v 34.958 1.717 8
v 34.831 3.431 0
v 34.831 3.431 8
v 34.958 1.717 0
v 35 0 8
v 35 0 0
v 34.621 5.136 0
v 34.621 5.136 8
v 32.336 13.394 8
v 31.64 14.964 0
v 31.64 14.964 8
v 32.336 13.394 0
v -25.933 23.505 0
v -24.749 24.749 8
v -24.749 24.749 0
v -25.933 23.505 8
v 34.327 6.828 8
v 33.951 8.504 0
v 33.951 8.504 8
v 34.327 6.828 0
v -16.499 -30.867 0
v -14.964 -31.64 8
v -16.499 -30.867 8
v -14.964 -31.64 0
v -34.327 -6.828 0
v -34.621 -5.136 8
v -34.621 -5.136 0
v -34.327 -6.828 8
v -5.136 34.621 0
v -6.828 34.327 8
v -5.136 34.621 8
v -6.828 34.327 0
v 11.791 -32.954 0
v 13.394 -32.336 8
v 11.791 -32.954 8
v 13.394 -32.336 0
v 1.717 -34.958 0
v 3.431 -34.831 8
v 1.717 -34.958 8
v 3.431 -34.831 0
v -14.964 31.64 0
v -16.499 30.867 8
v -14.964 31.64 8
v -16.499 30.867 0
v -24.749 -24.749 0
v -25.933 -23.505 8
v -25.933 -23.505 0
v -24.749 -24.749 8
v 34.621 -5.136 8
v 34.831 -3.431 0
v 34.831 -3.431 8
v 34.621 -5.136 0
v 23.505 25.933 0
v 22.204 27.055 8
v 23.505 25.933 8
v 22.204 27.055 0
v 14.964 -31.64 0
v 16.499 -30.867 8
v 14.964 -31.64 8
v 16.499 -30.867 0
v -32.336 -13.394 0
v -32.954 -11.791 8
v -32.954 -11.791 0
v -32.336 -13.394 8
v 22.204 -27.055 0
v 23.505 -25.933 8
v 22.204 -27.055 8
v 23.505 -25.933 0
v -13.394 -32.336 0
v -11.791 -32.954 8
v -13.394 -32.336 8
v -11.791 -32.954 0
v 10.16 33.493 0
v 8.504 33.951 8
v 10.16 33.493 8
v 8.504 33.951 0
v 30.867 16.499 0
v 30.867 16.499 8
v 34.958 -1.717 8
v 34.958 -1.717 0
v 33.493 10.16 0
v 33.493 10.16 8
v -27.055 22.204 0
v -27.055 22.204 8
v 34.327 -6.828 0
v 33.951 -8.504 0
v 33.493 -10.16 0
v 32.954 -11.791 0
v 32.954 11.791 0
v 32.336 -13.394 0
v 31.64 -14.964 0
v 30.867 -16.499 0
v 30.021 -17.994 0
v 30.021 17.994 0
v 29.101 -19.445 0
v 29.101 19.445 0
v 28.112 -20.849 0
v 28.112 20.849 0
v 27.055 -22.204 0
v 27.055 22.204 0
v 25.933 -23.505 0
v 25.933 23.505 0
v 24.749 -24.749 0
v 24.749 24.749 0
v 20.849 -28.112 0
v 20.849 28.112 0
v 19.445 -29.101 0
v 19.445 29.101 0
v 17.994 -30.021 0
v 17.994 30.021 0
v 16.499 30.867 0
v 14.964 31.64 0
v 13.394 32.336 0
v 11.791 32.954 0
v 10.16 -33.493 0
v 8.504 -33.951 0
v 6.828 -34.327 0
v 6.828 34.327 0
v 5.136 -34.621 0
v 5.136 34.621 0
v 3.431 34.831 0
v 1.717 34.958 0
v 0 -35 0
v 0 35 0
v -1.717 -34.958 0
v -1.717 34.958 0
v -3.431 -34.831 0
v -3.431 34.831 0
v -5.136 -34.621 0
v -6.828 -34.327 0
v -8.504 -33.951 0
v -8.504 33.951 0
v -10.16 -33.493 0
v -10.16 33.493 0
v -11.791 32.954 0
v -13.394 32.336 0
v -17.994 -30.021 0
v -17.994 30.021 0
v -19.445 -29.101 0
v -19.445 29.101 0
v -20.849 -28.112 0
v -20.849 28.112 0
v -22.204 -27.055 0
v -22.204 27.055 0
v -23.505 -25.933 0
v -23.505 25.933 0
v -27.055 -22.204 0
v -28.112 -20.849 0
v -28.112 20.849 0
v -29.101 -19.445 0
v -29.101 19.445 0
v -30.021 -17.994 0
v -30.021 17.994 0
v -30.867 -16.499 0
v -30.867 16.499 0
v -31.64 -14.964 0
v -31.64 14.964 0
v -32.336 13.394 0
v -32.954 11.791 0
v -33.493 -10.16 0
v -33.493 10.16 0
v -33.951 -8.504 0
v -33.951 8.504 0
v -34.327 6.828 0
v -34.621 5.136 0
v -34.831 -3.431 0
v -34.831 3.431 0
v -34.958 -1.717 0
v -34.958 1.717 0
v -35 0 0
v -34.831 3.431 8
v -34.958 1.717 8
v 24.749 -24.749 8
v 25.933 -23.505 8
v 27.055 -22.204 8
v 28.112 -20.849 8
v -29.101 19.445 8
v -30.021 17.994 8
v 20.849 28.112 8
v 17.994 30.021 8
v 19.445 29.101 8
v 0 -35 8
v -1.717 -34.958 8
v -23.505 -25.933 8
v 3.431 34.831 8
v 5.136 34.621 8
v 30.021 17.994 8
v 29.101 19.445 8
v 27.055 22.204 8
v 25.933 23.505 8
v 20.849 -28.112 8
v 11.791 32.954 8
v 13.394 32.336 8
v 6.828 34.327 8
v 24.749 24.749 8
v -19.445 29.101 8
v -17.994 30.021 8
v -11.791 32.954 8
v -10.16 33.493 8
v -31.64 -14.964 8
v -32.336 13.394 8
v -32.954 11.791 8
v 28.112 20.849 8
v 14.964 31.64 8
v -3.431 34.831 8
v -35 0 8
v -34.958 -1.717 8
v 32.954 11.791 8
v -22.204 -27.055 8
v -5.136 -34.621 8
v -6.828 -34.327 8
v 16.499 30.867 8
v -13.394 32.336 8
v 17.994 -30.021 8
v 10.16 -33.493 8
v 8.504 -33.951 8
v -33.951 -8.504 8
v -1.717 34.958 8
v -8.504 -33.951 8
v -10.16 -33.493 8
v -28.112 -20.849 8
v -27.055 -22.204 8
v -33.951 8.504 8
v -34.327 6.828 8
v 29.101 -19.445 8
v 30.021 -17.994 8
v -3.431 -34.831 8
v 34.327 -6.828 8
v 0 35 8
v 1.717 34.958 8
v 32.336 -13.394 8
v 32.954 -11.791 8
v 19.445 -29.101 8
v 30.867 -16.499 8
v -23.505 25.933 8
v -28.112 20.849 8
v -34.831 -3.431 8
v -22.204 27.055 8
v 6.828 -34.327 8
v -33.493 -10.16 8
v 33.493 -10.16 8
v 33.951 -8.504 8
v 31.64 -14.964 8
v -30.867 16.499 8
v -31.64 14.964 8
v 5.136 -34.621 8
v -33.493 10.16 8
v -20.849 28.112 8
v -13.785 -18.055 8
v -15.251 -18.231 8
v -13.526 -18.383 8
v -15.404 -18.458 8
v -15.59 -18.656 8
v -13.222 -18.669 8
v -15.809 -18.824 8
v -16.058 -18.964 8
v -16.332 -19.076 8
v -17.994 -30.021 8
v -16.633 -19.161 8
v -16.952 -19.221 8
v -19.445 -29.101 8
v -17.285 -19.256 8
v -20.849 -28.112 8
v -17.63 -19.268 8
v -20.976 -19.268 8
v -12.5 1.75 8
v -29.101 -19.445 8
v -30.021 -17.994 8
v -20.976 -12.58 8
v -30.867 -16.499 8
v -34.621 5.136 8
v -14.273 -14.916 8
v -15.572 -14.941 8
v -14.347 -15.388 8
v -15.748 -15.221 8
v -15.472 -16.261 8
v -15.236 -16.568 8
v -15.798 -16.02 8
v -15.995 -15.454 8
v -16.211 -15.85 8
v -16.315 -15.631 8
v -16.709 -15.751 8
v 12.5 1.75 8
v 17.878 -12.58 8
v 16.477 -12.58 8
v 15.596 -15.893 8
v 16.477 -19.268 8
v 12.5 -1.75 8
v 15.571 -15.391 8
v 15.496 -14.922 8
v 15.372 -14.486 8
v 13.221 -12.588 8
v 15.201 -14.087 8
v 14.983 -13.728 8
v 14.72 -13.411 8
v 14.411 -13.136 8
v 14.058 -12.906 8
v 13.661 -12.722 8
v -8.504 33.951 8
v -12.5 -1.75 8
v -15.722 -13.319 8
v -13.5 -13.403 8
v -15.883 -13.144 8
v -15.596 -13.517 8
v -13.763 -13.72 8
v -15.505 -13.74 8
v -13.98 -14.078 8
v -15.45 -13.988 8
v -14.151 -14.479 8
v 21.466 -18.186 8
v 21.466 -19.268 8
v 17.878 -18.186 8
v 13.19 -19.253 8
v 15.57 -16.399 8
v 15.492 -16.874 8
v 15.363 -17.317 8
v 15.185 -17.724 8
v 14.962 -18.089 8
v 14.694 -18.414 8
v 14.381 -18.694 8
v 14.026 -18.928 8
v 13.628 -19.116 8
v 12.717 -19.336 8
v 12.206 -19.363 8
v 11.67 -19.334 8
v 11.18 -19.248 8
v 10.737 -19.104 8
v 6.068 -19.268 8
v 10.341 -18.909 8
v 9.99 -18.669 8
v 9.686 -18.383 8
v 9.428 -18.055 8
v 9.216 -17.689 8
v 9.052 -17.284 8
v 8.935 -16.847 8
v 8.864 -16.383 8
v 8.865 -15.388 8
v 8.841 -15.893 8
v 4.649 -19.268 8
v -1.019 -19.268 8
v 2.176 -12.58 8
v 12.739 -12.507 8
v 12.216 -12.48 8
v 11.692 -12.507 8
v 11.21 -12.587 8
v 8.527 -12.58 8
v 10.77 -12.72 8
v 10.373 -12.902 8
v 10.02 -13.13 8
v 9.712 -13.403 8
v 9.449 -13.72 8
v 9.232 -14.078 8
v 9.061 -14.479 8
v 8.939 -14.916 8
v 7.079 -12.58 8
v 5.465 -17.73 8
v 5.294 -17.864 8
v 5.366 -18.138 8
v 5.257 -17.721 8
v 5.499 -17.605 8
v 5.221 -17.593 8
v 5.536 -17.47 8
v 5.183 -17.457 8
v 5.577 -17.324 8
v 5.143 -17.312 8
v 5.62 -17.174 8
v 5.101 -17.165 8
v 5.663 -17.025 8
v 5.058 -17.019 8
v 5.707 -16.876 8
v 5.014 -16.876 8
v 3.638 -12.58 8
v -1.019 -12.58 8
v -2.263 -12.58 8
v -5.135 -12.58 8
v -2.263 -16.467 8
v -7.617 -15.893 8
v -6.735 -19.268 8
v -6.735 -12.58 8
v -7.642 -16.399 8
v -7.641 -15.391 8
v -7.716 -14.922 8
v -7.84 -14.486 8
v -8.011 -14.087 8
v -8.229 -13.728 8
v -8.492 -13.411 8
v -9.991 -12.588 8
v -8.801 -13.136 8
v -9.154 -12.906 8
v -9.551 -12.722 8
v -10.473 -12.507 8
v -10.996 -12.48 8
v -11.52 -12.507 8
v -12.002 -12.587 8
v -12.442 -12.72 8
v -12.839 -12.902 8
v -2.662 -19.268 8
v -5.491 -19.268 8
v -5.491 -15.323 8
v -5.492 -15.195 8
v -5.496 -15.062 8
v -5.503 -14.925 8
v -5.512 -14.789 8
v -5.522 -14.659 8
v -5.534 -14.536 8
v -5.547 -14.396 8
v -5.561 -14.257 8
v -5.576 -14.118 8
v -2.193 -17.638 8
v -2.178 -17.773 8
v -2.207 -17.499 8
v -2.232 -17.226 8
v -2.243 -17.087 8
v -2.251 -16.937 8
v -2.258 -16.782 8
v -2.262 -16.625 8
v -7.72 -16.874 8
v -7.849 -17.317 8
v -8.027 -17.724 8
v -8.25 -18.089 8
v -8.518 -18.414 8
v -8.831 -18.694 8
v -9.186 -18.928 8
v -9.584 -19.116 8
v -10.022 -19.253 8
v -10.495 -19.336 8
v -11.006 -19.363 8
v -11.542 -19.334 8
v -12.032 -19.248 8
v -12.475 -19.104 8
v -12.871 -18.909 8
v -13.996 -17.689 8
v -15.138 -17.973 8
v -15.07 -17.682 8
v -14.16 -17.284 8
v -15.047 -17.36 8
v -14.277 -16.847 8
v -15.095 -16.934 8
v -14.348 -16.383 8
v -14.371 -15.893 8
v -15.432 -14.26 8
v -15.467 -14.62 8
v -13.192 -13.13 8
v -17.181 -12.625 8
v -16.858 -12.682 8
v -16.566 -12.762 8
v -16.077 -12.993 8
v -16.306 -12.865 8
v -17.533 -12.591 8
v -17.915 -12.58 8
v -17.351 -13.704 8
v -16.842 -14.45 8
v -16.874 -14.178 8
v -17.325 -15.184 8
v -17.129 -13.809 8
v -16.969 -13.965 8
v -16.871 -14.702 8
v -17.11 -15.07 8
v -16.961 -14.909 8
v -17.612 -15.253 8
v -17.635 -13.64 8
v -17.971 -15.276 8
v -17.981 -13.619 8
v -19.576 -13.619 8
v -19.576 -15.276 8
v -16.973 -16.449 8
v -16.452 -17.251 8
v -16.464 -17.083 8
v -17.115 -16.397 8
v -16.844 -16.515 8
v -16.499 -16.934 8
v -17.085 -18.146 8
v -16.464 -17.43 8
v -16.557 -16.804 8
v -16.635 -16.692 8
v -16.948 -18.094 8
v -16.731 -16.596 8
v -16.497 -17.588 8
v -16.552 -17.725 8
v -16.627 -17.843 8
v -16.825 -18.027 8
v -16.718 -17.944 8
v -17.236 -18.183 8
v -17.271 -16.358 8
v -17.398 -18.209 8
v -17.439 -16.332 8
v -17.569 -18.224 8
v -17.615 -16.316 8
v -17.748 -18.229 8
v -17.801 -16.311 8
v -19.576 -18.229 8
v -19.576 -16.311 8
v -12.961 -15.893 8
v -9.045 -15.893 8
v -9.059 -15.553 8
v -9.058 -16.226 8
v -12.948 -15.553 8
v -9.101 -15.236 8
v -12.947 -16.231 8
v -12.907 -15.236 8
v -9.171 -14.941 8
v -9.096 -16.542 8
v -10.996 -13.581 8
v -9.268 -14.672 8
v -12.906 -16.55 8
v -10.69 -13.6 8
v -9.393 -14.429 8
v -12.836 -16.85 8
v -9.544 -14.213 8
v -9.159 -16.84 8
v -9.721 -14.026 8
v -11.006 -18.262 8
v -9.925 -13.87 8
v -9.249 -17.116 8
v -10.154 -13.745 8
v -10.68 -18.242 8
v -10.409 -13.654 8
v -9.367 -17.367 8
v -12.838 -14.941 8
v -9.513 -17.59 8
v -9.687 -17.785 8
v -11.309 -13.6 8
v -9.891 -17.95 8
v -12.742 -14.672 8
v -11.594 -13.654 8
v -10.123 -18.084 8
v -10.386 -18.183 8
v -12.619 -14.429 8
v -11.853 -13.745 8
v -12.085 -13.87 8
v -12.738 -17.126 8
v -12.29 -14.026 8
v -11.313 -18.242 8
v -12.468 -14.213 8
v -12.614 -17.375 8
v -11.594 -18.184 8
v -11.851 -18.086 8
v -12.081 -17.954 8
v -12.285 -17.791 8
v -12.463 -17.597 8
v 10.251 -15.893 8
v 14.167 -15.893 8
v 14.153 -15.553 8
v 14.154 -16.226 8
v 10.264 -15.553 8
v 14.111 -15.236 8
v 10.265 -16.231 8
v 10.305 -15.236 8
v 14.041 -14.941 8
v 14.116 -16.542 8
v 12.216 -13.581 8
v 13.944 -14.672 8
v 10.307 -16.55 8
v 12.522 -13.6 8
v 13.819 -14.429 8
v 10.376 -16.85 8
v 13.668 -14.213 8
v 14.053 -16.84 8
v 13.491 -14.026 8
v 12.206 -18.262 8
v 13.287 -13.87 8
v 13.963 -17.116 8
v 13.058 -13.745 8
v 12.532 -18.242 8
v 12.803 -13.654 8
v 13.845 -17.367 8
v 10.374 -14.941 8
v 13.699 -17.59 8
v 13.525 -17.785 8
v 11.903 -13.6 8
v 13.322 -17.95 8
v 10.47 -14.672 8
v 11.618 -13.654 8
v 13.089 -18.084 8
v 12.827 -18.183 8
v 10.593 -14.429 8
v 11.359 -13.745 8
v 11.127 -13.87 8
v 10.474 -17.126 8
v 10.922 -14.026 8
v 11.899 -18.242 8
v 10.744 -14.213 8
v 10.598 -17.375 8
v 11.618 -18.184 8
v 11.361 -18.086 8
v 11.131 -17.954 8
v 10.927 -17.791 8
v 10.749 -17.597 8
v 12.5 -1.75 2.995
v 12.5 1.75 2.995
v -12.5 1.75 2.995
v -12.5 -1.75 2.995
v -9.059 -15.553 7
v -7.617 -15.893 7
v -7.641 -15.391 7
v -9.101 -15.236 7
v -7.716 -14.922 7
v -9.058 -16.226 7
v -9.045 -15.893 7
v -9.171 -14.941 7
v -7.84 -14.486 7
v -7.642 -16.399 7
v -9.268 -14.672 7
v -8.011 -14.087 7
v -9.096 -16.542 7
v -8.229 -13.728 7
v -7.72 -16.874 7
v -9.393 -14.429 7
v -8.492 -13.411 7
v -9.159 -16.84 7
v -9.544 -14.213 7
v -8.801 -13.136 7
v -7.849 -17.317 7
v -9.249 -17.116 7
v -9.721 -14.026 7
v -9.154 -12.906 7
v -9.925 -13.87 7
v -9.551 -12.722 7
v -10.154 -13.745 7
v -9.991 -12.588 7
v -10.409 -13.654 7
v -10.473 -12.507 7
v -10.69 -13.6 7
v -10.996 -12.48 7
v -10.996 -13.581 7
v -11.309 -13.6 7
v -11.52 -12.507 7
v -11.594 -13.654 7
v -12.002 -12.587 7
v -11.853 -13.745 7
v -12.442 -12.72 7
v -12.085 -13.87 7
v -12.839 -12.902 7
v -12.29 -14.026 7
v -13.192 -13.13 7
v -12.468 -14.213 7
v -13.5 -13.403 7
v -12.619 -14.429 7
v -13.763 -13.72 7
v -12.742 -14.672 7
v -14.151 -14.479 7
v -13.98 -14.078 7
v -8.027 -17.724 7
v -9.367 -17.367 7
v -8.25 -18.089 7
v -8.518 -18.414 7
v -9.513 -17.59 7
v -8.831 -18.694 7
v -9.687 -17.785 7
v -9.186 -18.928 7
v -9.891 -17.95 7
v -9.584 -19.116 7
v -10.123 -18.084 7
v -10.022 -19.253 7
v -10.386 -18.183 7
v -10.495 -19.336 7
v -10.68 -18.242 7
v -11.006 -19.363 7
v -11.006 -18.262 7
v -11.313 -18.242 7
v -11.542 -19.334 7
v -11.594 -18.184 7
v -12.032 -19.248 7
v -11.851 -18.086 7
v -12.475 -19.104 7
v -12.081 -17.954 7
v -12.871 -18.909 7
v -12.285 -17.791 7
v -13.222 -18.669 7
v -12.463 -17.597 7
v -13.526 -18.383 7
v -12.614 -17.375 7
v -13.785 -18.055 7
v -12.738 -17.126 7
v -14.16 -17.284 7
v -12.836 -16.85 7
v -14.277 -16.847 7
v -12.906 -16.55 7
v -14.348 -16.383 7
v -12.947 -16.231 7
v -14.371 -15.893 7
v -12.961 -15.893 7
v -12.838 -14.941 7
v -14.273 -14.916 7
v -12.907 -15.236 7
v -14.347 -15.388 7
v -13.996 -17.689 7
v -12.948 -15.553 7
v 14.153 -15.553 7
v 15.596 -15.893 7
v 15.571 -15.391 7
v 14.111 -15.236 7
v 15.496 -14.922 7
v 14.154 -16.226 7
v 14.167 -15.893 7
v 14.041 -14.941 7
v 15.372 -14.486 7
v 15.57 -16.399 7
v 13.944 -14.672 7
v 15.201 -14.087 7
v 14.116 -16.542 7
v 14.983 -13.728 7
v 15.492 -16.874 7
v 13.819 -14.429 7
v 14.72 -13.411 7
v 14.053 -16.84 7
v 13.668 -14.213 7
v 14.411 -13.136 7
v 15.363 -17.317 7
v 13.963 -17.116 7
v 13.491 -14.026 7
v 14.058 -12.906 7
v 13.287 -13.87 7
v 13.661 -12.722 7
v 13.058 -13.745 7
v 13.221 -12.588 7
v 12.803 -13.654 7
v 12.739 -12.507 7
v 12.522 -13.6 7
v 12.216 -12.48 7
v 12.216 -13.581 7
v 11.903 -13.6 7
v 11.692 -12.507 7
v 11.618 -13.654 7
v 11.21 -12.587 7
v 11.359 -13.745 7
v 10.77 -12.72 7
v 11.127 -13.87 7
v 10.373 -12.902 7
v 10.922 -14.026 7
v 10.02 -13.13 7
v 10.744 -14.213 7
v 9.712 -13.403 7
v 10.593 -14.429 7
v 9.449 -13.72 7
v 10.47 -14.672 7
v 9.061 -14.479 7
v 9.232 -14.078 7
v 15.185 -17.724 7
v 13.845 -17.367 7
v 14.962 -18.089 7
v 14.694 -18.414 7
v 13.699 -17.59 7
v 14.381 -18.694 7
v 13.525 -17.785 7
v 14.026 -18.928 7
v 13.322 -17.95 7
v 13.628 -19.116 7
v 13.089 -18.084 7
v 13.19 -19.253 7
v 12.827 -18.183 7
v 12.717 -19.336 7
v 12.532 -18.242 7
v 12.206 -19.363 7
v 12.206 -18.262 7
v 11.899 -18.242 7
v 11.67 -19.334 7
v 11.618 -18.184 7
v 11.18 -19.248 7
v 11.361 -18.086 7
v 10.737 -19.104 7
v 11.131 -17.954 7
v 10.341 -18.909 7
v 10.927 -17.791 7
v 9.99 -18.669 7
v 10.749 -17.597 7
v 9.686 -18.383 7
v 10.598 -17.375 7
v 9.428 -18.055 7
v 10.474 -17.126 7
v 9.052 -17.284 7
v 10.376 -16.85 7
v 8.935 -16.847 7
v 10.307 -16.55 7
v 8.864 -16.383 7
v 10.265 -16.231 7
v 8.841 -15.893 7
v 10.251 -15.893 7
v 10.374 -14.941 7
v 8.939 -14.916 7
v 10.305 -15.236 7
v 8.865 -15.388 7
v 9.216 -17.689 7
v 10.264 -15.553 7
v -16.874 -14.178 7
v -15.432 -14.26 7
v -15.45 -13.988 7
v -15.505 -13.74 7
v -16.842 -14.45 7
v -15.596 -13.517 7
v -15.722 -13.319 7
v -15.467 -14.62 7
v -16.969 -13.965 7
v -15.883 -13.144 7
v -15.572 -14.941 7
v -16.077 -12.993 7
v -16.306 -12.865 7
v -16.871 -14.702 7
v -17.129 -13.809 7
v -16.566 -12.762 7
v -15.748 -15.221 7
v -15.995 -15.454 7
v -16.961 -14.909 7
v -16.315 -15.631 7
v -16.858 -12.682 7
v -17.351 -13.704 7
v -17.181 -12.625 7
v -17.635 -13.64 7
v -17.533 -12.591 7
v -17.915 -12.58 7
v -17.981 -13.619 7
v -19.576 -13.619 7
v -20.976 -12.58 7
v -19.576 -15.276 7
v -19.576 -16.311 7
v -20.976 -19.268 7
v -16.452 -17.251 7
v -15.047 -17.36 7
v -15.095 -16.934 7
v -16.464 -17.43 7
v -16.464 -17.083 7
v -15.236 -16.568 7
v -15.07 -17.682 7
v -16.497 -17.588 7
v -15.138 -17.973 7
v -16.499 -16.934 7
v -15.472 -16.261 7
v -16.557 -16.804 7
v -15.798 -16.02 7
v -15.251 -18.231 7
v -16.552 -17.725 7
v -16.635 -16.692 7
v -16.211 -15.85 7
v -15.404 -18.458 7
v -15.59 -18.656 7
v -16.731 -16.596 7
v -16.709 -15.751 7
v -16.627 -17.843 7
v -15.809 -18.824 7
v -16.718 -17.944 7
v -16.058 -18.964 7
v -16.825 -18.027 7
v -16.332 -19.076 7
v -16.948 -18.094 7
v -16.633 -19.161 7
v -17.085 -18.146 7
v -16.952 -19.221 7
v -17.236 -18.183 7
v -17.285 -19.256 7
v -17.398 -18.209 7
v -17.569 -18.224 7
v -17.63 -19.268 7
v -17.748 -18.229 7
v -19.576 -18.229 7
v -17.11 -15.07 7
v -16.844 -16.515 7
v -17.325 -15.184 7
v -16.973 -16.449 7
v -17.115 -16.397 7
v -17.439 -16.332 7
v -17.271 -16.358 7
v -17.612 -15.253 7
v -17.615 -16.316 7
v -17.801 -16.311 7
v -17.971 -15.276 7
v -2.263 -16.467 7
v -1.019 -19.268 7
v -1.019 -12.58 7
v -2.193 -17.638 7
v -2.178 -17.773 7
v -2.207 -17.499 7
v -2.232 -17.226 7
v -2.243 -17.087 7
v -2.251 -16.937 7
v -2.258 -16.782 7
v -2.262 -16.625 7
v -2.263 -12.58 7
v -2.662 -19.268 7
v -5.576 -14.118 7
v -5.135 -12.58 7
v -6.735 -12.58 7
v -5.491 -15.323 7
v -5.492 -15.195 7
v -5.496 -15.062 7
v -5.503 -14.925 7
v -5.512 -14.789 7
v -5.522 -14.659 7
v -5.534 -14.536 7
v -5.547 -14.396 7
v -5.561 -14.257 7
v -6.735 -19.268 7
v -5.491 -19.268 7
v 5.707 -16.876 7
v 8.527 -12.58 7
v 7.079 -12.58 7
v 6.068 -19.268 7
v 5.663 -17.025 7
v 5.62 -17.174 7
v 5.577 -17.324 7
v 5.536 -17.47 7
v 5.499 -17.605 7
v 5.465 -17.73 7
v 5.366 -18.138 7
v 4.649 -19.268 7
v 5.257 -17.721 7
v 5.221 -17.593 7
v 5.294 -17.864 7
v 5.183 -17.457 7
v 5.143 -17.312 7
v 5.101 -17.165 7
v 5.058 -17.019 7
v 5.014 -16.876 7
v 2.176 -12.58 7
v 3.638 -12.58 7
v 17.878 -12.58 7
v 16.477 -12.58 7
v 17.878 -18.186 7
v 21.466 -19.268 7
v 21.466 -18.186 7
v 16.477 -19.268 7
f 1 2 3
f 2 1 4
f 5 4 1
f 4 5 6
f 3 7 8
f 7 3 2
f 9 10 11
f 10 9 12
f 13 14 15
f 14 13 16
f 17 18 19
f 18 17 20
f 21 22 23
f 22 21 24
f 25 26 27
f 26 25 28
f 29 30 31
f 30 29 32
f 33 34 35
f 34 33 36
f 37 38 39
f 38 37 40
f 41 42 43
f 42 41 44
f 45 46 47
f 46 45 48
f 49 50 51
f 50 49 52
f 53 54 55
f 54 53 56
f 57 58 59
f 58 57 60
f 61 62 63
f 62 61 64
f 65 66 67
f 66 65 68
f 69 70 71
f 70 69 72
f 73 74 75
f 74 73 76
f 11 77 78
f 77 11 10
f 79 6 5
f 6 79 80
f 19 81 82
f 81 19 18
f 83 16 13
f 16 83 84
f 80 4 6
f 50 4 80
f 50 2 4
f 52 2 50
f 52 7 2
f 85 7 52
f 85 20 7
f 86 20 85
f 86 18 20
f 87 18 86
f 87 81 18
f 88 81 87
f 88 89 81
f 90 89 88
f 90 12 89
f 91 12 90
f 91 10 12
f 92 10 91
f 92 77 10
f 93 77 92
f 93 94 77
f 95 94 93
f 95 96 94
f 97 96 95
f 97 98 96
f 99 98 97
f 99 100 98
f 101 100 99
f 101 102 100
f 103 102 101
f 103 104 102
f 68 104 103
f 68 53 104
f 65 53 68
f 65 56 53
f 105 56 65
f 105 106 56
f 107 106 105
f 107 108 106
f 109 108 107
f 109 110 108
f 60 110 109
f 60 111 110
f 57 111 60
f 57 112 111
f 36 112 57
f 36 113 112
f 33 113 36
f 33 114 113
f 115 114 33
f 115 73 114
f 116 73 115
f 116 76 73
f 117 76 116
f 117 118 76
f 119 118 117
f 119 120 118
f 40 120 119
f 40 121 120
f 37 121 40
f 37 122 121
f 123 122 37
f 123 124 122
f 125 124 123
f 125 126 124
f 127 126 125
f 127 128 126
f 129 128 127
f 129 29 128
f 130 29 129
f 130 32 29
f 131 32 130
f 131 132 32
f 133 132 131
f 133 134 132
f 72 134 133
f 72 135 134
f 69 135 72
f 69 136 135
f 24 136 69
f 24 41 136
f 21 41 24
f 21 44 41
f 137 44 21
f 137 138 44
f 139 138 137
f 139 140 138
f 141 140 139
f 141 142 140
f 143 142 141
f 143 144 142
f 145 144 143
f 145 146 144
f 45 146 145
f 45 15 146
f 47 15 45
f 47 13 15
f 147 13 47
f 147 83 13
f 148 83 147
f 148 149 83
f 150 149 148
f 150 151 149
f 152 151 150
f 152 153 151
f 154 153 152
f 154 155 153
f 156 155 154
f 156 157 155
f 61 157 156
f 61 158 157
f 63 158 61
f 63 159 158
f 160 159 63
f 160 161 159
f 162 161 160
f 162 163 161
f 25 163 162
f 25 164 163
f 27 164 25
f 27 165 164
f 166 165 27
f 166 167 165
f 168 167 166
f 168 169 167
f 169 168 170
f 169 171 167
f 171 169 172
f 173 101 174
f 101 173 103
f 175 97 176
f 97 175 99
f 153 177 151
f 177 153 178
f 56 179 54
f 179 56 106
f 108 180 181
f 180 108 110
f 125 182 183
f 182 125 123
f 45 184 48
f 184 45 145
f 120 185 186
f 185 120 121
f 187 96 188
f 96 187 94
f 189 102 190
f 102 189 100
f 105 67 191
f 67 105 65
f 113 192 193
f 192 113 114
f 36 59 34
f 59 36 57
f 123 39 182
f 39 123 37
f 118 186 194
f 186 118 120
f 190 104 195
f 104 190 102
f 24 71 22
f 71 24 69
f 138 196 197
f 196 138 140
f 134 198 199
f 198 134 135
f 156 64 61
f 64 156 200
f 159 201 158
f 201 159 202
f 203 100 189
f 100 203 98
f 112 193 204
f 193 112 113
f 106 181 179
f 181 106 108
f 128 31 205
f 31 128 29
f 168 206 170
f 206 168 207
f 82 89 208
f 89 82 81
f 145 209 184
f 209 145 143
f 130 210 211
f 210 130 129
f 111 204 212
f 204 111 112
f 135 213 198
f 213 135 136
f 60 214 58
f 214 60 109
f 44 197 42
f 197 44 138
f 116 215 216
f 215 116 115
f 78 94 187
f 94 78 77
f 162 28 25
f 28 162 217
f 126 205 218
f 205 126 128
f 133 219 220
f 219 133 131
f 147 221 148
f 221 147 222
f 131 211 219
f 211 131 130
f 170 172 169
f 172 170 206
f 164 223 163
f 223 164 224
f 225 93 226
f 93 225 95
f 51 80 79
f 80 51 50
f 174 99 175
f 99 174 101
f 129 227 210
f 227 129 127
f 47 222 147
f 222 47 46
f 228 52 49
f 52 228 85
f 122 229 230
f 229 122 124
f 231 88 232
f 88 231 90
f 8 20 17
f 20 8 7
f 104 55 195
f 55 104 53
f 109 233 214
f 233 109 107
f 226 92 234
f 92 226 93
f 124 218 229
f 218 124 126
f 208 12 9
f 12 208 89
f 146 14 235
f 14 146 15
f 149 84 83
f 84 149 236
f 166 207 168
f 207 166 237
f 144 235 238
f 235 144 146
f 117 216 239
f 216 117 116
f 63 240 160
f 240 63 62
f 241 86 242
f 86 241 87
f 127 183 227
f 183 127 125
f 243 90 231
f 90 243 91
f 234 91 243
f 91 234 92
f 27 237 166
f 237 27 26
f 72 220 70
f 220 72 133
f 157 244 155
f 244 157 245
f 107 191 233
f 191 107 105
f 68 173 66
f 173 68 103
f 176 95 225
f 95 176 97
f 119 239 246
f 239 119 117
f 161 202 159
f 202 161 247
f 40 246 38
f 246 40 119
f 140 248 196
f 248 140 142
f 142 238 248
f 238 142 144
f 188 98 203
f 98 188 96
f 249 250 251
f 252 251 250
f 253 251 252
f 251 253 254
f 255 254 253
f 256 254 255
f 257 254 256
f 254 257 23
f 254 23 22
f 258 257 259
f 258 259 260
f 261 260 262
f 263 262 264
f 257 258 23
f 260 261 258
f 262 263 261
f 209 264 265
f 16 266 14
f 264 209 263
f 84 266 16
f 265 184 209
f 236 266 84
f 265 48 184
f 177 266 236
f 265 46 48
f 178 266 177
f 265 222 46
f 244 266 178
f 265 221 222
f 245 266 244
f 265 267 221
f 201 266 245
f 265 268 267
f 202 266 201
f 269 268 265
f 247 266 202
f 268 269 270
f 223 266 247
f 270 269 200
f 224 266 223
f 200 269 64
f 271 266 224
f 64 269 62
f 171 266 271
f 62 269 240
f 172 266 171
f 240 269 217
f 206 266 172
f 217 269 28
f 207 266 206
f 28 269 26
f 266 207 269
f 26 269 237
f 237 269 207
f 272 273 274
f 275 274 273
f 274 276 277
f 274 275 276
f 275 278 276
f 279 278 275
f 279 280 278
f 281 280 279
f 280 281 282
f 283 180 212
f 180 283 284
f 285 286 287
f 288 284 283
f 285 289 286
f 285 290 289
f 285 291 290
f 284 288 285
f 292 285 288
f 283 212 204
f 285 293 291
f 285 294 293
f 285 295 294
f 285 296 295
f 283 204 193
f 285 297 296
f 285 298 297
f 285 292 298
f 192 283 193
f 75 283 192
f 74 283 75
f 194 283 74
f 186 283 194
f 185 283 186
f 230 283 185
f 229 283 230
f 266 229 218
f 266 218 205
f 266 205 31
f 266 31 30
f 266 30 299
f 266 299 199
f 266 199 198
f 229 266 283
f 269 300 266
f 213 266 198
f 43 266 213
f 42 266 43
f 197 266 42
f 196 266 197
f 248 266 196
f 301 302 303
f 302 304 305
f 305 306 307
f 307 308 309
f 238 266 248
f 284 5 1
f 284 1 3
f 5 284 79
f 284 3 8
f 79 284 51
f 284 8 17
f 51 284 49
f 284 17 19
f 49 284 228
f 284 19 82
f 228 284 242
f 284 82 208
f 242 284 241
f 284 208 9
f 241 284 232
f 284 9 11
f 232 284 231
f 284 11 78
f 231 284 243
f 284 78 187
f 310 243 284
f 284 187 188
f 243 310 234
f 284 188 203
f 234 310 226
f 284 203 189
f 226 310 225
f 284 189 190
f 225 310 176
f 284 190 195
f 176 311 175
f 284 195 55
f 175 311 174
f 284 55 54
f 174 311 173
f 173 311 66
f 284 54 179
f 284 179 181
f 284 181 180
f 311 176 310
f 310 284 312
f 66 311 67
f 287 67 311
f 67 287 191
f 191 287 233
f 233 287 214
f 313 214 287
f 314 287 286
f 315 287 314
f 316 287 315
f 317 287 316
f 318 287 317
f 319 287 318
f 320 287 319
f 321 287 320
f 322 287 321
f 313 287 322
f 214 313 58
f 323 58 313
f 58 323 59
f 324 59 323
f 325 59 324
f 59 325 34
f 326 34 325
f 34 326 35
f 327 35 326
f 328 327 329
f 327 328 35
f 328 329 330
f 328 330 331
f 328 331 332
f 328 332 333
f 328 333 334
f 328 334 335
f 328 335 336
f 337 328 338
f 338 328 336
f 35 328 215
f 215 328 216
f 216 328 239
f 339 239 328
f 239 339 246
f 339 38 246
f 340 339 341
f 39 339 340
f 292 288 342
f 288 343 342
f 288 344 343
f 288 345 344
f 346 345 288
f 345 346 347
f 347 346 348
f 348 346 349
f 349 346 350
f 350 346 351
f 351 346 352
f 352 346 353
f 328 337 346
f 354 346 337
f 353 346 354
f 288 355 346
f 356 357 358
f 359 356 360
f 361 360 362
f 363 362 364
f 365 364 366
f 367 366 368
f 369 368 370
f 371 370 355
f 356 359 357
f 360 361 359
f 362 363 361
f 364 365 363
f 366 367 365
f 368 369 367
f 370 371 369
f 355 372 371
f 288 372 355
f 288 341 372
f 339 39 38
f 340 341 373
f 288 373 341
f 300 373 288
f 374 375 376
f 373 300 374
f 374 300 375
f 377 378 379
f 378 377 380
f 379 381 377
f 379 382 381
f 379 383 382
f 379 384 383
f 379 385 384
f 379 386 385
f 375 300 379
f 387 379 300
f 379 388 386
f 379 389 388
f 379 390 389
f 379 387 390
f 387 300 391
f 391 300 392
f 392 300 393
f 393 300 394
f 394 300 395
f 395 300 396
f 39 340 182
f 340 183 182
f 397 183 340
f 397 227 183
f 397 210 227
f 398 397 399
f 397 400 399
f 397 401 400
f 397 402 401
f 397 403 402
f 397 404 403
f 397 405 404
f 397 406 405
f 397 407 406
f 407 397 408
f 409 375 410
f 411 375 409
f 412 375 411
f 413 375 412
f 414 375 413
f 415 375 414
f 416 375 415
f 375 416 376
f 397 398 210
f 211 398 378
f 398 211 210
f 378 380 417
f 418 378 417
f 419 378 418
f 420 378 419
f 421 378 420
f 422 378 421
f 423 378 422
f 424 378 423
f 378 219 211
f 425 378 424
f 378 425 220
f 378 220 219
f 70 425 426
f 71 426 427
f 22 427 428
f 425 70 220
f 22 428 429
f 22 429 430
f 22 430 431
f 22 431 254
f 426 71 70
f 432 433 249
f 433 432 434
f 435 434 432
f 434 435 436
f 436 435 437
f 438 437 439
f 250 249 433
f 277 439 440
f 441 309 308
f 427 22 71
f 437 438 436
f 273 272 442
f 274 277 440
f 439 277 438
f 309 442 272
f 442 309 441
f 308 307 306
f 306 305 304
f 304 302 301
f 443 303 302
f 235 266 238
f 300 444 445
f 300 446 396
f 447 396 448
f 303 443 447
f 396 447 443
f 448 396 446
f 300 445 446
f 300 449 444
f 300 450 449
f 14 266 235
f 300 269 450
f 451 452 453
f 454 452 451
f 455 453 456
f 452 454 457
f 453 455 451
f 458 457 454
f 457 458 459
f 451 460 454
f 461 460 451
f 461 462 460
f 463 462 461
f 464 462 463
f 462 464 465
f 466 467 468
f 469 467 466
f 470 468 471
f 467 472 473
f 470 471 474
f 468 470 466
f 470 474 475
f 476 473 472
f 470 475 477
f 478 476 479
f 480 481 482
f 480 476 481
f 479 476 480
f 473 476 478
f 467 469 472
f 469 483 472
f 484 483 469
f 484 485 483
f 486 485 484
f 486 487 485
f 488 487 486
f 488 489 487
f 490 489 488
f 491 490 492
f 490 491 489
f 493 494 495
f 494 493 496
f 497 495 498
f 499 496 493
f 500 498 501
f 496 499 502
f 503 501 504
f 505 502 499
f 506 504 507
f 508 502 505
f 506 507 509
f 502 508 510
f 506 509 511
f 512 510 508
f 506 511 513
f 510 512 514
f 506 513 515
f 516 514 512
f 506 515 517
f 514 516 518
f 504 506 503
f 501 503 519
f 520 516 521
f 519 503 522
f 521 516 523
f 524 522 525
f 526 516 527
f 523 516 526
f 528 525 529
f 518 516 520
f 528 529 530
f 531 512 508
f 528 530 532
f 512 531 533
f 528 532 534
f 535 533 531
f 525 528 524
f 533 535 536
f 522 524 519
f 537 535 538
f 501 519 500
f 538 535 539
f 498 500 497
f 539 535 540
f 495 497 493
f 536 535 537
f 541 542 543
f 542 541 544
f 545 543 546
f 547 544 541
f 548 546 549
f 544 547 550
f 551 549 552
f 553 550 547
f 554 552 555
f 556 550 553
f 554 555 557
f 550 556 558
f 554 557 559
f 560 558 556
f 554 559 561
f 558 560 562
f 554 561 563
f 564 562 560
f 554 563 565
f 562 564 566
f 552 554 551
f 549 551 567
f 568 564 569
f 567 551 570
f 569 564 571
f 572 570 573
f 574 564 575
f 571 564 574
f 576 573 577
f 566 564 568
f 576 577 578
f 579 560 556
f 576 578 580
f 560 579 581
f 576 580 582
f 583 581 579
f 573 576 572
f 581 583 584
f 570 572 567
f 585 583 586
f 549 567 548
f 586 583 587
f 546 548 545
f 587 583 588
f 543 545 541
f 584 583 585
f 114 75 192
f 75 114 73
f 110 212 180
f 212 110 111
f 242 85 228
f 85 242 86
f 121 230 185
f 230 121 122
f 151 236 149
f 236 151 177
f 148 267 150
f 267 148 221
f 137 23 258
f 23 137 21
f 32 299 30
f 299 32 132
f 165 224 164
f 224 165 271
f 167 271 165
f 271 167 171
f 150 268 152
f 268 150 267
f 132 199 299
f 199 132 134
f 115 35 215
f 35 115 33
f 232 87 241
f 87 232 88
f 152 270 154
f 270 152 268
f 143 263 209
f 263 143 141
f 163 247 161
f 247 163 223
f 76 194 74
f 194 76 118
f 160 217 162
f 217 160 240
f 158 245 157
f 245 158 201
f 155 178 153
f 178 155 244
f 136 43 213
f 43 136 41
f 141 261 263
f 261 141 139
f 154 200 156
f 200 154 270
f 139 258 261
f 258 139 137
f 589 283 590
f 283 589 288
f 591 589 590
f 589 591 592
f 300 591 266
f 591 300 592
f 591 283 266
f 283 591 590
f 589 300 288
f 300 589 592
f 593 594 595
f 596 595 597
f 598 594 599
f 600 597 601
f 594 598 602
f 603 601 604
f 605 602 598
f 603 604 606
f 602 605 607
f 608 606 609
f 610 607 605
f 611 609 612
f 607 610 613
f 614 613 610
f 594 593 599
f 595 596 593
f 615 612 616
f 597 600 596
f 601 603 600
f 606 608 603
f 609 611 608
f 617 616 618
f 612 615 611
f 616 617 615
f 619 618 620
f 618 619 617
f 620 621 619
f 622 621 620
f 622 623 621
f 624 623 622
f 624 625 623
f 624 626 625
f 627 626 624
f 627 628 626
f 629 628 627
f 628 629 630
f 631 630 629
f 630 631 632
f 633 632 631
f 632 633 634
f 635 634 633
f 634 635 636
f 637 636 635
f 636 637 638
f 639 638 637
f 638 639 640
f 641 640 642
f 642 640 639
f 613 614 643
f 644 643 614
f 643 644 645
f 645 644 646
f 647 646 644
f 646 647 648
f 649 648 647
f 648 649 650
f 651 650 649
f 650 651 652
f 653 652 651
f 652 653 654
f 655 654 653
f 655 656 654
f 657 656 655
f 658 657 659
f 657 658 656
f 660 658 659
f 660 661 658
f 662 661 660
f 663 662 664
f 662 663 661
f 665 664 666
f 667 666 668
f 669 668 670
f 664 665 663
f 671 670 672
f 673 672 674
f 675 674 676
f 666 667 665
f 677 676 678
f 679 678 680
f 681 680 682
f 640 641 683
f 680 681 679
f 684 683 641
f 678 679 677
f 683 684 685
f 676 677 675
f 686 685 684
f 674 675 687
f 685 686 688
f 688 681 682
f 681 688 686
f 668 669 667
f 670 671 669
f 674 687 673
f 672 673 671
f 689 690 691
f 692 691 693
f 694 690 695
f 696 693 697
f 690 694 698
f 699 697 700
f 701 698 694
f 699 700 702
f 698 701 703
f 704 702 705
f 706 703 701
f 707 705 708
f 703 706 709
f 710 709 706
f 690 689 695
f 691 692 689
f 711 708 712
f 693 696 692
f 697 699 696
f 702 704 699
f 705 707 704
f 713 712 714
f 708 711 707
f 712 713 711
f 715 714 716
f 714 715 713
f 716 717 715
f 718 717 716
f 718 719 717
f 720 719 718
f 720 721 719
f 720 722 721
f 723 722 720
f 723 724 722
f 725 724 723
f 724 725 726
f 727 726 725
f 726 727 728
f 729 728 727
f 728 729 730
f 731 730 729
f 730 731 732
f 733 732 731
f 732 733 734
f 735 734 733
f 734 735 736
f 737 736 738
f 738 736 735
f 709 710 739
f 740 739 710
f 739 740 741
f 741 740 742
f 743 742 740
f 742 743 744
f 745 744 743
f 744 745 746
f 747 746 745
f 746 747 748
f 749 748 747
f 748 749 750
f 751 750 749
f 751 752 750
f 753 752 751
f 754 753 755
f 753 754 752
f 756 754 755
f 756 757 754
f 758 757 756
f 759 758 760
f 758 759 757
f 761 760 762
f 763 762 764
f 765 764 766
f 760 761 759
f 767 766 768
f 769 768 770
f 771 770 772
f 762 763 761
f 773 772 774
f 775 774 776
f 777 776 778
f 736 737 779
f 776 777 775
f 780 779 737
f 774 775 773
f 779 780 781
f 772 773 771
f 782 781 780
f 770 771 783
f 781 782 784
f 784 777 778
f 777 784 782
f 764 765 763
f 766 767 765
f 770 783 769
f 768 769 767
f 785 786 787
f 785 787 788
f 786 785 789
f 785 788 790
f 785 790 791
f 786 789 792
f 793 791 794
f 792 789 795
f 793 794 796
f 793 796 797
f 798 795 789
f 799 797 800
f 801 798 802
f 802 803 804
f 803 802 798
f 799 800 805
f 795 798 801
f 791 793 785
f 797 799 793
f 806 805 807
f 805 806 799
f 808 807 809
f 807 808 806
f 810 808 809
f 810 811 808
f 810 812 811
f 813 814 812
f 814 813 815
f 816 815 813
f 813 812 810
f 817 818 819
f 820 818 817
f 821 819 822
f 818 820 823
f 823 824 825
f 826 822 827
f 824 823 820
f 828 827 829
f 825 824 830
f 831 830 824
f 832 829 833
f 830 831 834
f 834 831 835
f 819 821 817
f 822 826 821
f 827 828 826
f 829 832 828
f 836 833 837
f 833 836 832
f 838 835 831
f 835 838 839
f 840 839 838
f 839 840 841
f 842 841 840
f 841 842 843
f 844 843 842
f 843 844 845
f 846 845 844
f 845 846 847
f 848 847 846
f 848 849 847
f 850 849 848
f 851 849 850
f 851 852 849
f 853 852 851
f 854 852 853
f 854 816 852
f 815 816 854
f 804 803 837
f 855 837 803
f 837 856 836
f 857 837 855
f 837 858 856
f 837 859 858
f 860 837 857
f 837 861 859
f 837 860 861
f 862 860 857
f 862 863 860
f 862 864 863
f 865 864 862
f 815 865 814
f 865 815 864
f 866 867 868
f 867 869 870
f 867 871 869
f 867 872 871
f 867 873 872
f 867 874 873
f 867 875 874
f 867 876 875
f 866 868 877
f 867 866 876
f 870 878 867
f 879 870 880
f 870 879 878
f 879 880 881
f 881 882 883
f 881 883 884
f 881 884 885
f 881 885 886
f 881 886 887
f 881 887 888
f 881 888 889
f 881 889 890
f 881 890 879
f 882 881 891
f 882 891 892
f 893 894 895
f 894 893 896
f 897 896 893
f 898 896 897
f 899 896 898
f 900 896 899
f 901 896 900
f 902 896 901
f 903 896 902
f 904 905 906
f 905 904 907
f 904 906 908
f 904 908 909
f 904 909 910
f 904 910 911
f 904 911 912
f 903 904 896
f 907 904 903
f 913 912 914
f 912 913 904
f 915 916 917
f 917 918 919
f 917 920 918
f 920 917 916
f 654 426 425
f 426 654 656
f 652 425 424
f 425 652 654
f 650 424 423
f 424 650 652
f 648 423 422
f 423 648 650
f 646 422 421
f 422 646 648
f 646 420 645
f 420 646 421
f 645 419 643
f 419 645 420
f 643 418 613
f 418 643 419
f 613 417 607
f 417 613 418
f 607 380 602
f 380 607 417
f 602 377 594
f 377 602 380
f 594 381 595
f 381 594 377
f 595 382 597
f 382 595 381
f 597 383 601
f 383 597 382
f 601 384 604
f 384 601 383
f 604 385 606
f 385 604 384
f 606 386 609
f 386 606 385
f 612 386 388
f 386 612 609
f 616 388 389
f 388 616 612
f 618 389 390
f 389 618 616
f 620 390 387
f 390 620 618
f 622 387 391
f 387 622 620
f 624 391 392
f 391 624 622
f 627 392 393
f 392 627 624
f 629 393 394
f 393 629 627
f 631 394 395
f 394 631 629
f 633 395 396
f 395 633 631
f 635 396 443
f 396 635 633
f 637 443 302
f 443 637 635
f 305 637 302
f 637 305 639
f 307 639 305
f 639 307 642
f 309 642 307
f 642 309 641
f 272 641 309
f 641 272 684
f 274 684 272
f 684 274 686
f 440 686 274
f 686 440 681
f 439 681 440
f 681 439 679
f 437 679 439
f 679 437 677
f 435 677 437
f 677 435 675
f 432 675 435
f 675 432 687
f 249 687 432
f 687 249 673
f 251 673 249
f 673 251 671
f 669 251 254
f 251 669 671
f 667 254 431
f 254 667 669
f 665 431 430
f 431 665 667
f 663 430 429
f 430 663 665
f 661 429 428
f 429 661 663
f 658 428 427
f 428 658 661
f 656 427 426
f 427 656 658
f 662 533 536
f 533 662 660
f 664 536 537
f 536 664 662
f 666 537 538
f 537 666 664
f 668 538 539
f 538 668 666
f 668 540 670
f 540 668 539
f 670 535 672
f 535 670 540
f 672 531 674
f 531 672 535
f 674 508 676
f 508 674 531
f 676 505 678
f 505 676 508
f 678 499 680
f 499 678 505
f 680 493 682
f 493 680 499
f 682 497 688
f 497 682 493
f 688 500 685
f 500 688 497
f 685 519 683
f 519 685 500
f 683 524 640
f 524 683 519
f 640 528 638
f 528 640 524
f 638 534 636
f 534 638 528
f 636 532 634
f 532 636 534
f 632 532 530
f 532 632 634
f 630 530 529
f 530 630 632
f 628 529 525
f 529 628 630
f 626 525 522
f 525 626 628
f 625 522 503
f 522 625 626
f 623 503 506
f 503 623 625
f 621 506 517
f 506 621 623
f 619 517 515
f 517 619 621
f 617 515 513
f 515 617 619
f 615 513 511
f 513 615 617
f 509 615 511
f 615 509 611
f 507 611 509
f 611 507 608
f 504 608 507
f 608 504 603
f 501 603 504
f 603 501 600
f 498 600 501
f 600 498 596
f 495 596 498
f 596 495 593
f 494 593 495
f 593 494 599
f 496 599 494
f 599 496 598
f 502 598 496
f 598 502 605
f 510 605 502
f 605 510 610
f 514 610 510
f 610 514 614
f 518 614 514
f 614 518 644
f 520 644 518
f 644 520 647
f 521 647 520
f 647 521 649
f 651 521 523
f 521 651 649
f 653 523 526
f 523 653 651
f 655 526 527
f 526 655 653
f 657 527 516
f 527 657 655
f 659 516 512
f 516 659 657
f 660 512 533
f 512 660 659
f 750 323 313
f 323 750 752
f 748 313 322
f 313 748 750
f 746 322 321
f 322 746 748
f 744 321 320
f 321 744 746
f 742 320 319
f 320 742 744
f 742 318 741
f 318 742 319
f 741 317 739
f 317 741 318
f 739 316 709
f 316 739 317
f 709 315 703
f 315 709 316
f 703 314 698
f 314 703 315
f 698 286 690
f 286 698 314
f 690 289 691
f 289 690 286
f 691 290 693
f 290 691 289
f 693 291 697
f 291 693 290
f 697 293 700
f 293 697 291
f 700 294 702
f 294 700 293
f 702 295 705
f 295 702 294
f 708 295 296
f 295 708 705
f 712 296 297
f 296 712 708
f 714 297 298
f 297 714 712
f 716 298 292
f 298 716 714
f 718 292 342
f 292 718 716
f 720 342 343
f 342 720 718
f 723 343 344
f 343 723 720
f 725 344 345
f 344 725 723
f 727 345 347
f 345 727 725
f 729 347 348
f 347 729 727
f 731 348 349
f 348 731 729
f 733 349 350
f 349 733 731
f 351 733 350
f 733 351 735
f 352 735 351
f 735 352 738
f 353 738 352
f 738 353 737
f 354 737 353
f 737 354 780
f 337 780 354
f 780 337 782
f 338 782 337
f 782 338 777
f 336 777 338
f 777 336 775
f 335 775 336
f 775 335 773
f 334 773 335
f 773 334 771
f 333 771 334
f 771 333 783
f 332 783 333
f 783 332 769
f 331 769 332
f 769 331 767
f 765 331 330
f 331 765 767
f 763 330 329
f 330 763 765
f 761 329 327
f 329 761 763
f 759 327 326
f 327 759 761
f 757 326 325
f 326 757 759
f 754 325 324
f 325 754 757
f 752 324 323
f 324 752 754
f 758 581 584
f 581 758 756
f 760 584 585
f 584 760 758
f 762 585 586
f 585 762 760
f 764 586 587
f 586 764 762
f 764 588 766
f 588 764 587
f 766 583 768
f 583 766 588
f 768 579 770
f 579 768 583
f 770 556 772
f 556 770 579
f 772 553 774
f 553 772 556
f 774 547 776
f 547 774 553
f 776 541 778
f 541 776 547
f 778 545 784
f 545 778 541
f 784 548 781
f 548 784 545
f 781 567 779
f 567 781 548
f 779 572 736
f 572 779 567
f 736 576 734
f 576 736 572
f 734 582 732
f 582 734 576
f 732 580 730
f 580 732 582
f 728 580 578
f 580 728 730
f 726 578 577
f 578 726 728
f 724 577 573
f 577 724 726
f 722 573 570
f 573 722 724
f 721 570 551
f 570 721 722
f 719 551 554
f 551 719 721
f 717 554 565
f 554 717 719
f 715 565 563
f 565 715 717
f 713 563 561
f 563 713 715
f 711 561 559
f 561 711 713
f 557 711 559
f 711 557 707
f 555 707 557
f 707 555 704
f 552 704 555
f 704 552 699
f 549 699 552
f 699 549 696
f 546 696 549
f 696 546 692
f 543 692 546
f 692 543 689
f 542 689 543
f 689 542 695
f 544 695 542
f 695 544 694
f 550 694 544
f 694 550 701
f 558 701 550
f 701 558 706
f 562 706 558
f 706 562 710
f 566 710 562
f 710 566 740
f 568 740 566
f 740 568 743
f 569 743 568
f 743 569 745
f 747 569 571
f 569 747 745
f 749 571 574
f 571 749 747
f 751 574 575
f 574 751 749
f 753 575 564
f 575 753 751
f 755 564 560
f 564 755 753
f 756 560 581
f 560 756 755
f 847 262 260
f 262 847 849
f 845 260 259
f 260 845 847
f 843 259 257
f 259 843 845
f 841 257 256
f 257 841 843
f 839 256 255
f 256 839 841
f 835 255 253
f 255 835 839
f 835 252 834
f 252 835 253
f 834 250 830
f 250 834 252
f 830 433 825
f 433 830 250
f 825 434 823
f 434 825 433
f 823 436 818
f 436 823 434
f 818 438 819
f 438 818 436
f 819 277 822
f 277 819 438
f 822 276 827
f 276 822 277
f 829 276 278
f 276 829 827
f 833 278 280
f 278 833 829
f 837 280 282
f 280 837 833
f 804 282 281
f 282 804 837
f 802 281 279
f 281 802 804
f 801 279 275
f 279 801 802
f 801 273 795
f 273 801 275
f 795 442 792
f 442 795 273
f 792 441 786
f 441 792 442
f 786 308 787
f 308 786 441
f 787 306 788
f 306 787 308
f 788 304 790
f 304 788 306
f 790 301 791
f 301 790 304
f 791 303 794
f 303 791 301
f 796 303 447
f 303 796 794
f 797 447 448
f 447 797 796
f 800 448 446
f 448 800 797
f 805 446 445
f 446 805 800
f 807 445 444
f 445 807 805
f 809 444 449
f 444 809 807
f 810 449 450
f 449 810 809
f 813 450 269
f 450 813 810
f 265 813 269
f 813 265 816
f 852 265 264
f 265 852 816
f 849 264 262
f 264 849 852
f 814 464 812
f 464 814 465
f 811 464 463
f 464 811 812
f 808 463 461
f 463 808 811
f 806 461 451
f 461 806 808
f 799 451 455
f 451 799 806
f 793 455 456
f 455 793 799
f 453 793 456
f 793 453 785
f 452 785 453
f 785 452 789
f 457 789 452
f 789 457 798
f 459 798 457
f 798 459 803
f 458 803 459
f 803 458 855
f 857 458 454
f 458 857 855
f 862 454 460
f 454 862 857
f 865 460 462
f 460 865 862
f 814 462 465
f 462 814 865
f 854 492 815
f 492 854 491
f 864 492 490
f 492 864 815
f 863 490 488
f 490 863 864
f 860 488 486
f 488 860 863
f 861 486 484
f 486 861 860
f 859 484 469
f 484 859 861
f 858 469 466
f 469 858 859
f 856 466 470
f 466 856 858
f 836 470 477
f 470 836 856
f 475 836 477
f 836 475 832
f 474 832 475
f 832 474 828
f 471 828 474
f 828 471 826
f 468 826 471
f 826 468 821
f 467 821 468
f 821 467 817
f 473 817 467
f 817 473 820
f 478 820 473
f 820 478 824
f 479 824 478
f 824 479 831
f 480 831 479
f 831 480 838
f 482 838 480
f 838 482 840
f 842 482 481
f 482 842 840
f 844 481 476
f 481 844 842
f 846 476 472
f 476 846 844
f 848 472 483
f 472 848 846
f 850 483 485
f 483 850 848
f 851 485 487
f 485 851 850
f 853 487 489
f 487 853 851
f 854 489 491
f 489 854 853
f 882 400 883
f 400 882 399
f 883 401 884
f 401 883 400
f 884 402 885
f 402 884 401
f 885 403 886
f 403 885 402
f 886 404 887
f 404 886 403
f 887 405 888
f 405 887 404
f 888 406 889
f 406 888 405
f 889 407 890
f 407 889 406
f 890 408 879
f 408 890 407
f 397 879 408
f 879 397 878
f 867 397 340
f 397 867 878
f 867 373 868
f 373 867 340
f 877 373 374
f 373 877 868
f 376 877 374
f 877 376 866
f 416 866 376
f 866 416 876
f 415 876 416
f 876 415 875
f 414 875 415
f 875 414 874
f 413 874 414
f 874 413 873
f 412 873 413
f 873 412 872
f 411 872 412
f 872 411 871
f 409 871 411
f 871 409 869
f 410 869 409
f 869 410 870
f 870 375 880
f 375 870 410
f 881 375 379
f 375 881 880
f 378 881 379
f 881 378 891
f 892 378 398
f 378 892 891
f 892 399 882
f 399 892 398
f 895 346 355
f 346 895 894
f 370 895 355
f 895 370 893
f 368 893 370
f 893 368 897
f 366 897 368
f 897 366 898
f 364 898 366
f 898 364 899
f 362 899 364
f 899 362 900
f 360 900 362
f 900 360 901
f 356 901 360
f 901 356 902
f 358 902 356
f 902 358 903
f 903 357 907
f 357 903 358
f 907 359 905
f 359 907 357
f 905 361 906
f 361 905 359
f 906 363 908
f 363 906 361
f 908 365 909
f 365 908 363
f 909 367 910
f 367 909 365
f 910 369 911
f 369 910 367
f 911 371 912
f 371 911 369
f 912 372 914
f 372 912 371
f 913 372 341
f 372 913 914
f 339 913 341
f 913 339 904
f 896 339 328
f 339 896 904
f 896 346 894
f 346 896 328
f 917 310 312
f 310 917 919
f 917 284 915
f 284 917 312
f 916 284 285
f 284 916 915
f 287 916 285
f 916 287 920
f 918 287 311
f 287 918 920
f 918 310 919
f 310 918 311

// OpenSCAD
// ============================================================
//  Socle paramoteur – "BON VOL" (Version Corrigée)
//  Imprimable en FDM, face inférieure posée sur le plateau
// ============================================================

// ── Socle principal ──────────────────────────────────────────
diametre_socle   = 70;    // mm – diamètre du disque
hauteur_socle    = 8;     // mm – hauteur totale du socle

// ── Fente de maintien (centrée, sur le dessus) ───────────────
fente_longueur   = 25;    // mm – longueur de la fente
fente_largeur    = 3.5;   // mm – épaisseur de la fente
fente_profondeur = 5;     // mm – profondeur (ne traverse pas le socle)

// ── Texte gravé en creux ─────────────────────────────────────
texte            = "BON VOL";
texte_taille     = 7;     // mm – hauteur des caractères
texte_profondeur = 1;     // mm – profondeur de la gravure
texte_police     = "Liberation Sans:style=Bold";
// Décalage en Y : valeur négative = vers l'avant (face visible)
// La fente est centrée en [0,0] ; le texte se place devant elle
texte_decalage_y = -16;   // mm

// Tolérance pour éviter les artefacts de faces coplanaires
eps = 0.01;

// ============================================================
//  Construction
// ============================================================
difference() {

    // ── Corps : disque plat ───────────────────────────────────
    cylinder(
        h    = hauteur_socle,
        d    = diametre_socle,
        $fn  = 128
    );

    // ── Fente rectangulaire sur la face supérieure ───────────
    // center=true : le cube est centré → translate au milieu de la fente
    translate([0, 0, hauteur_socle - (fente_profondeur / 2)])
        cube(
            [fente_longueur, fente_largeur, fente_profondeur + eps],
            center = true
        );

    // ── Gravure "BON VOL" en creux (face supérieure, avant) ──
    // linear_extrude vers le bas depuis la surface : on soustrait 1 mm
    translate([0, texte_decalage_y, hauteur_socle - texte_profondeur])
        linear_extrude(height = texte_profondeur + eps)
            text(
                texte,
                size   = texte_taille,
                font   = texte_police,
                halign = "center",
                valign = "center"
            );
}
